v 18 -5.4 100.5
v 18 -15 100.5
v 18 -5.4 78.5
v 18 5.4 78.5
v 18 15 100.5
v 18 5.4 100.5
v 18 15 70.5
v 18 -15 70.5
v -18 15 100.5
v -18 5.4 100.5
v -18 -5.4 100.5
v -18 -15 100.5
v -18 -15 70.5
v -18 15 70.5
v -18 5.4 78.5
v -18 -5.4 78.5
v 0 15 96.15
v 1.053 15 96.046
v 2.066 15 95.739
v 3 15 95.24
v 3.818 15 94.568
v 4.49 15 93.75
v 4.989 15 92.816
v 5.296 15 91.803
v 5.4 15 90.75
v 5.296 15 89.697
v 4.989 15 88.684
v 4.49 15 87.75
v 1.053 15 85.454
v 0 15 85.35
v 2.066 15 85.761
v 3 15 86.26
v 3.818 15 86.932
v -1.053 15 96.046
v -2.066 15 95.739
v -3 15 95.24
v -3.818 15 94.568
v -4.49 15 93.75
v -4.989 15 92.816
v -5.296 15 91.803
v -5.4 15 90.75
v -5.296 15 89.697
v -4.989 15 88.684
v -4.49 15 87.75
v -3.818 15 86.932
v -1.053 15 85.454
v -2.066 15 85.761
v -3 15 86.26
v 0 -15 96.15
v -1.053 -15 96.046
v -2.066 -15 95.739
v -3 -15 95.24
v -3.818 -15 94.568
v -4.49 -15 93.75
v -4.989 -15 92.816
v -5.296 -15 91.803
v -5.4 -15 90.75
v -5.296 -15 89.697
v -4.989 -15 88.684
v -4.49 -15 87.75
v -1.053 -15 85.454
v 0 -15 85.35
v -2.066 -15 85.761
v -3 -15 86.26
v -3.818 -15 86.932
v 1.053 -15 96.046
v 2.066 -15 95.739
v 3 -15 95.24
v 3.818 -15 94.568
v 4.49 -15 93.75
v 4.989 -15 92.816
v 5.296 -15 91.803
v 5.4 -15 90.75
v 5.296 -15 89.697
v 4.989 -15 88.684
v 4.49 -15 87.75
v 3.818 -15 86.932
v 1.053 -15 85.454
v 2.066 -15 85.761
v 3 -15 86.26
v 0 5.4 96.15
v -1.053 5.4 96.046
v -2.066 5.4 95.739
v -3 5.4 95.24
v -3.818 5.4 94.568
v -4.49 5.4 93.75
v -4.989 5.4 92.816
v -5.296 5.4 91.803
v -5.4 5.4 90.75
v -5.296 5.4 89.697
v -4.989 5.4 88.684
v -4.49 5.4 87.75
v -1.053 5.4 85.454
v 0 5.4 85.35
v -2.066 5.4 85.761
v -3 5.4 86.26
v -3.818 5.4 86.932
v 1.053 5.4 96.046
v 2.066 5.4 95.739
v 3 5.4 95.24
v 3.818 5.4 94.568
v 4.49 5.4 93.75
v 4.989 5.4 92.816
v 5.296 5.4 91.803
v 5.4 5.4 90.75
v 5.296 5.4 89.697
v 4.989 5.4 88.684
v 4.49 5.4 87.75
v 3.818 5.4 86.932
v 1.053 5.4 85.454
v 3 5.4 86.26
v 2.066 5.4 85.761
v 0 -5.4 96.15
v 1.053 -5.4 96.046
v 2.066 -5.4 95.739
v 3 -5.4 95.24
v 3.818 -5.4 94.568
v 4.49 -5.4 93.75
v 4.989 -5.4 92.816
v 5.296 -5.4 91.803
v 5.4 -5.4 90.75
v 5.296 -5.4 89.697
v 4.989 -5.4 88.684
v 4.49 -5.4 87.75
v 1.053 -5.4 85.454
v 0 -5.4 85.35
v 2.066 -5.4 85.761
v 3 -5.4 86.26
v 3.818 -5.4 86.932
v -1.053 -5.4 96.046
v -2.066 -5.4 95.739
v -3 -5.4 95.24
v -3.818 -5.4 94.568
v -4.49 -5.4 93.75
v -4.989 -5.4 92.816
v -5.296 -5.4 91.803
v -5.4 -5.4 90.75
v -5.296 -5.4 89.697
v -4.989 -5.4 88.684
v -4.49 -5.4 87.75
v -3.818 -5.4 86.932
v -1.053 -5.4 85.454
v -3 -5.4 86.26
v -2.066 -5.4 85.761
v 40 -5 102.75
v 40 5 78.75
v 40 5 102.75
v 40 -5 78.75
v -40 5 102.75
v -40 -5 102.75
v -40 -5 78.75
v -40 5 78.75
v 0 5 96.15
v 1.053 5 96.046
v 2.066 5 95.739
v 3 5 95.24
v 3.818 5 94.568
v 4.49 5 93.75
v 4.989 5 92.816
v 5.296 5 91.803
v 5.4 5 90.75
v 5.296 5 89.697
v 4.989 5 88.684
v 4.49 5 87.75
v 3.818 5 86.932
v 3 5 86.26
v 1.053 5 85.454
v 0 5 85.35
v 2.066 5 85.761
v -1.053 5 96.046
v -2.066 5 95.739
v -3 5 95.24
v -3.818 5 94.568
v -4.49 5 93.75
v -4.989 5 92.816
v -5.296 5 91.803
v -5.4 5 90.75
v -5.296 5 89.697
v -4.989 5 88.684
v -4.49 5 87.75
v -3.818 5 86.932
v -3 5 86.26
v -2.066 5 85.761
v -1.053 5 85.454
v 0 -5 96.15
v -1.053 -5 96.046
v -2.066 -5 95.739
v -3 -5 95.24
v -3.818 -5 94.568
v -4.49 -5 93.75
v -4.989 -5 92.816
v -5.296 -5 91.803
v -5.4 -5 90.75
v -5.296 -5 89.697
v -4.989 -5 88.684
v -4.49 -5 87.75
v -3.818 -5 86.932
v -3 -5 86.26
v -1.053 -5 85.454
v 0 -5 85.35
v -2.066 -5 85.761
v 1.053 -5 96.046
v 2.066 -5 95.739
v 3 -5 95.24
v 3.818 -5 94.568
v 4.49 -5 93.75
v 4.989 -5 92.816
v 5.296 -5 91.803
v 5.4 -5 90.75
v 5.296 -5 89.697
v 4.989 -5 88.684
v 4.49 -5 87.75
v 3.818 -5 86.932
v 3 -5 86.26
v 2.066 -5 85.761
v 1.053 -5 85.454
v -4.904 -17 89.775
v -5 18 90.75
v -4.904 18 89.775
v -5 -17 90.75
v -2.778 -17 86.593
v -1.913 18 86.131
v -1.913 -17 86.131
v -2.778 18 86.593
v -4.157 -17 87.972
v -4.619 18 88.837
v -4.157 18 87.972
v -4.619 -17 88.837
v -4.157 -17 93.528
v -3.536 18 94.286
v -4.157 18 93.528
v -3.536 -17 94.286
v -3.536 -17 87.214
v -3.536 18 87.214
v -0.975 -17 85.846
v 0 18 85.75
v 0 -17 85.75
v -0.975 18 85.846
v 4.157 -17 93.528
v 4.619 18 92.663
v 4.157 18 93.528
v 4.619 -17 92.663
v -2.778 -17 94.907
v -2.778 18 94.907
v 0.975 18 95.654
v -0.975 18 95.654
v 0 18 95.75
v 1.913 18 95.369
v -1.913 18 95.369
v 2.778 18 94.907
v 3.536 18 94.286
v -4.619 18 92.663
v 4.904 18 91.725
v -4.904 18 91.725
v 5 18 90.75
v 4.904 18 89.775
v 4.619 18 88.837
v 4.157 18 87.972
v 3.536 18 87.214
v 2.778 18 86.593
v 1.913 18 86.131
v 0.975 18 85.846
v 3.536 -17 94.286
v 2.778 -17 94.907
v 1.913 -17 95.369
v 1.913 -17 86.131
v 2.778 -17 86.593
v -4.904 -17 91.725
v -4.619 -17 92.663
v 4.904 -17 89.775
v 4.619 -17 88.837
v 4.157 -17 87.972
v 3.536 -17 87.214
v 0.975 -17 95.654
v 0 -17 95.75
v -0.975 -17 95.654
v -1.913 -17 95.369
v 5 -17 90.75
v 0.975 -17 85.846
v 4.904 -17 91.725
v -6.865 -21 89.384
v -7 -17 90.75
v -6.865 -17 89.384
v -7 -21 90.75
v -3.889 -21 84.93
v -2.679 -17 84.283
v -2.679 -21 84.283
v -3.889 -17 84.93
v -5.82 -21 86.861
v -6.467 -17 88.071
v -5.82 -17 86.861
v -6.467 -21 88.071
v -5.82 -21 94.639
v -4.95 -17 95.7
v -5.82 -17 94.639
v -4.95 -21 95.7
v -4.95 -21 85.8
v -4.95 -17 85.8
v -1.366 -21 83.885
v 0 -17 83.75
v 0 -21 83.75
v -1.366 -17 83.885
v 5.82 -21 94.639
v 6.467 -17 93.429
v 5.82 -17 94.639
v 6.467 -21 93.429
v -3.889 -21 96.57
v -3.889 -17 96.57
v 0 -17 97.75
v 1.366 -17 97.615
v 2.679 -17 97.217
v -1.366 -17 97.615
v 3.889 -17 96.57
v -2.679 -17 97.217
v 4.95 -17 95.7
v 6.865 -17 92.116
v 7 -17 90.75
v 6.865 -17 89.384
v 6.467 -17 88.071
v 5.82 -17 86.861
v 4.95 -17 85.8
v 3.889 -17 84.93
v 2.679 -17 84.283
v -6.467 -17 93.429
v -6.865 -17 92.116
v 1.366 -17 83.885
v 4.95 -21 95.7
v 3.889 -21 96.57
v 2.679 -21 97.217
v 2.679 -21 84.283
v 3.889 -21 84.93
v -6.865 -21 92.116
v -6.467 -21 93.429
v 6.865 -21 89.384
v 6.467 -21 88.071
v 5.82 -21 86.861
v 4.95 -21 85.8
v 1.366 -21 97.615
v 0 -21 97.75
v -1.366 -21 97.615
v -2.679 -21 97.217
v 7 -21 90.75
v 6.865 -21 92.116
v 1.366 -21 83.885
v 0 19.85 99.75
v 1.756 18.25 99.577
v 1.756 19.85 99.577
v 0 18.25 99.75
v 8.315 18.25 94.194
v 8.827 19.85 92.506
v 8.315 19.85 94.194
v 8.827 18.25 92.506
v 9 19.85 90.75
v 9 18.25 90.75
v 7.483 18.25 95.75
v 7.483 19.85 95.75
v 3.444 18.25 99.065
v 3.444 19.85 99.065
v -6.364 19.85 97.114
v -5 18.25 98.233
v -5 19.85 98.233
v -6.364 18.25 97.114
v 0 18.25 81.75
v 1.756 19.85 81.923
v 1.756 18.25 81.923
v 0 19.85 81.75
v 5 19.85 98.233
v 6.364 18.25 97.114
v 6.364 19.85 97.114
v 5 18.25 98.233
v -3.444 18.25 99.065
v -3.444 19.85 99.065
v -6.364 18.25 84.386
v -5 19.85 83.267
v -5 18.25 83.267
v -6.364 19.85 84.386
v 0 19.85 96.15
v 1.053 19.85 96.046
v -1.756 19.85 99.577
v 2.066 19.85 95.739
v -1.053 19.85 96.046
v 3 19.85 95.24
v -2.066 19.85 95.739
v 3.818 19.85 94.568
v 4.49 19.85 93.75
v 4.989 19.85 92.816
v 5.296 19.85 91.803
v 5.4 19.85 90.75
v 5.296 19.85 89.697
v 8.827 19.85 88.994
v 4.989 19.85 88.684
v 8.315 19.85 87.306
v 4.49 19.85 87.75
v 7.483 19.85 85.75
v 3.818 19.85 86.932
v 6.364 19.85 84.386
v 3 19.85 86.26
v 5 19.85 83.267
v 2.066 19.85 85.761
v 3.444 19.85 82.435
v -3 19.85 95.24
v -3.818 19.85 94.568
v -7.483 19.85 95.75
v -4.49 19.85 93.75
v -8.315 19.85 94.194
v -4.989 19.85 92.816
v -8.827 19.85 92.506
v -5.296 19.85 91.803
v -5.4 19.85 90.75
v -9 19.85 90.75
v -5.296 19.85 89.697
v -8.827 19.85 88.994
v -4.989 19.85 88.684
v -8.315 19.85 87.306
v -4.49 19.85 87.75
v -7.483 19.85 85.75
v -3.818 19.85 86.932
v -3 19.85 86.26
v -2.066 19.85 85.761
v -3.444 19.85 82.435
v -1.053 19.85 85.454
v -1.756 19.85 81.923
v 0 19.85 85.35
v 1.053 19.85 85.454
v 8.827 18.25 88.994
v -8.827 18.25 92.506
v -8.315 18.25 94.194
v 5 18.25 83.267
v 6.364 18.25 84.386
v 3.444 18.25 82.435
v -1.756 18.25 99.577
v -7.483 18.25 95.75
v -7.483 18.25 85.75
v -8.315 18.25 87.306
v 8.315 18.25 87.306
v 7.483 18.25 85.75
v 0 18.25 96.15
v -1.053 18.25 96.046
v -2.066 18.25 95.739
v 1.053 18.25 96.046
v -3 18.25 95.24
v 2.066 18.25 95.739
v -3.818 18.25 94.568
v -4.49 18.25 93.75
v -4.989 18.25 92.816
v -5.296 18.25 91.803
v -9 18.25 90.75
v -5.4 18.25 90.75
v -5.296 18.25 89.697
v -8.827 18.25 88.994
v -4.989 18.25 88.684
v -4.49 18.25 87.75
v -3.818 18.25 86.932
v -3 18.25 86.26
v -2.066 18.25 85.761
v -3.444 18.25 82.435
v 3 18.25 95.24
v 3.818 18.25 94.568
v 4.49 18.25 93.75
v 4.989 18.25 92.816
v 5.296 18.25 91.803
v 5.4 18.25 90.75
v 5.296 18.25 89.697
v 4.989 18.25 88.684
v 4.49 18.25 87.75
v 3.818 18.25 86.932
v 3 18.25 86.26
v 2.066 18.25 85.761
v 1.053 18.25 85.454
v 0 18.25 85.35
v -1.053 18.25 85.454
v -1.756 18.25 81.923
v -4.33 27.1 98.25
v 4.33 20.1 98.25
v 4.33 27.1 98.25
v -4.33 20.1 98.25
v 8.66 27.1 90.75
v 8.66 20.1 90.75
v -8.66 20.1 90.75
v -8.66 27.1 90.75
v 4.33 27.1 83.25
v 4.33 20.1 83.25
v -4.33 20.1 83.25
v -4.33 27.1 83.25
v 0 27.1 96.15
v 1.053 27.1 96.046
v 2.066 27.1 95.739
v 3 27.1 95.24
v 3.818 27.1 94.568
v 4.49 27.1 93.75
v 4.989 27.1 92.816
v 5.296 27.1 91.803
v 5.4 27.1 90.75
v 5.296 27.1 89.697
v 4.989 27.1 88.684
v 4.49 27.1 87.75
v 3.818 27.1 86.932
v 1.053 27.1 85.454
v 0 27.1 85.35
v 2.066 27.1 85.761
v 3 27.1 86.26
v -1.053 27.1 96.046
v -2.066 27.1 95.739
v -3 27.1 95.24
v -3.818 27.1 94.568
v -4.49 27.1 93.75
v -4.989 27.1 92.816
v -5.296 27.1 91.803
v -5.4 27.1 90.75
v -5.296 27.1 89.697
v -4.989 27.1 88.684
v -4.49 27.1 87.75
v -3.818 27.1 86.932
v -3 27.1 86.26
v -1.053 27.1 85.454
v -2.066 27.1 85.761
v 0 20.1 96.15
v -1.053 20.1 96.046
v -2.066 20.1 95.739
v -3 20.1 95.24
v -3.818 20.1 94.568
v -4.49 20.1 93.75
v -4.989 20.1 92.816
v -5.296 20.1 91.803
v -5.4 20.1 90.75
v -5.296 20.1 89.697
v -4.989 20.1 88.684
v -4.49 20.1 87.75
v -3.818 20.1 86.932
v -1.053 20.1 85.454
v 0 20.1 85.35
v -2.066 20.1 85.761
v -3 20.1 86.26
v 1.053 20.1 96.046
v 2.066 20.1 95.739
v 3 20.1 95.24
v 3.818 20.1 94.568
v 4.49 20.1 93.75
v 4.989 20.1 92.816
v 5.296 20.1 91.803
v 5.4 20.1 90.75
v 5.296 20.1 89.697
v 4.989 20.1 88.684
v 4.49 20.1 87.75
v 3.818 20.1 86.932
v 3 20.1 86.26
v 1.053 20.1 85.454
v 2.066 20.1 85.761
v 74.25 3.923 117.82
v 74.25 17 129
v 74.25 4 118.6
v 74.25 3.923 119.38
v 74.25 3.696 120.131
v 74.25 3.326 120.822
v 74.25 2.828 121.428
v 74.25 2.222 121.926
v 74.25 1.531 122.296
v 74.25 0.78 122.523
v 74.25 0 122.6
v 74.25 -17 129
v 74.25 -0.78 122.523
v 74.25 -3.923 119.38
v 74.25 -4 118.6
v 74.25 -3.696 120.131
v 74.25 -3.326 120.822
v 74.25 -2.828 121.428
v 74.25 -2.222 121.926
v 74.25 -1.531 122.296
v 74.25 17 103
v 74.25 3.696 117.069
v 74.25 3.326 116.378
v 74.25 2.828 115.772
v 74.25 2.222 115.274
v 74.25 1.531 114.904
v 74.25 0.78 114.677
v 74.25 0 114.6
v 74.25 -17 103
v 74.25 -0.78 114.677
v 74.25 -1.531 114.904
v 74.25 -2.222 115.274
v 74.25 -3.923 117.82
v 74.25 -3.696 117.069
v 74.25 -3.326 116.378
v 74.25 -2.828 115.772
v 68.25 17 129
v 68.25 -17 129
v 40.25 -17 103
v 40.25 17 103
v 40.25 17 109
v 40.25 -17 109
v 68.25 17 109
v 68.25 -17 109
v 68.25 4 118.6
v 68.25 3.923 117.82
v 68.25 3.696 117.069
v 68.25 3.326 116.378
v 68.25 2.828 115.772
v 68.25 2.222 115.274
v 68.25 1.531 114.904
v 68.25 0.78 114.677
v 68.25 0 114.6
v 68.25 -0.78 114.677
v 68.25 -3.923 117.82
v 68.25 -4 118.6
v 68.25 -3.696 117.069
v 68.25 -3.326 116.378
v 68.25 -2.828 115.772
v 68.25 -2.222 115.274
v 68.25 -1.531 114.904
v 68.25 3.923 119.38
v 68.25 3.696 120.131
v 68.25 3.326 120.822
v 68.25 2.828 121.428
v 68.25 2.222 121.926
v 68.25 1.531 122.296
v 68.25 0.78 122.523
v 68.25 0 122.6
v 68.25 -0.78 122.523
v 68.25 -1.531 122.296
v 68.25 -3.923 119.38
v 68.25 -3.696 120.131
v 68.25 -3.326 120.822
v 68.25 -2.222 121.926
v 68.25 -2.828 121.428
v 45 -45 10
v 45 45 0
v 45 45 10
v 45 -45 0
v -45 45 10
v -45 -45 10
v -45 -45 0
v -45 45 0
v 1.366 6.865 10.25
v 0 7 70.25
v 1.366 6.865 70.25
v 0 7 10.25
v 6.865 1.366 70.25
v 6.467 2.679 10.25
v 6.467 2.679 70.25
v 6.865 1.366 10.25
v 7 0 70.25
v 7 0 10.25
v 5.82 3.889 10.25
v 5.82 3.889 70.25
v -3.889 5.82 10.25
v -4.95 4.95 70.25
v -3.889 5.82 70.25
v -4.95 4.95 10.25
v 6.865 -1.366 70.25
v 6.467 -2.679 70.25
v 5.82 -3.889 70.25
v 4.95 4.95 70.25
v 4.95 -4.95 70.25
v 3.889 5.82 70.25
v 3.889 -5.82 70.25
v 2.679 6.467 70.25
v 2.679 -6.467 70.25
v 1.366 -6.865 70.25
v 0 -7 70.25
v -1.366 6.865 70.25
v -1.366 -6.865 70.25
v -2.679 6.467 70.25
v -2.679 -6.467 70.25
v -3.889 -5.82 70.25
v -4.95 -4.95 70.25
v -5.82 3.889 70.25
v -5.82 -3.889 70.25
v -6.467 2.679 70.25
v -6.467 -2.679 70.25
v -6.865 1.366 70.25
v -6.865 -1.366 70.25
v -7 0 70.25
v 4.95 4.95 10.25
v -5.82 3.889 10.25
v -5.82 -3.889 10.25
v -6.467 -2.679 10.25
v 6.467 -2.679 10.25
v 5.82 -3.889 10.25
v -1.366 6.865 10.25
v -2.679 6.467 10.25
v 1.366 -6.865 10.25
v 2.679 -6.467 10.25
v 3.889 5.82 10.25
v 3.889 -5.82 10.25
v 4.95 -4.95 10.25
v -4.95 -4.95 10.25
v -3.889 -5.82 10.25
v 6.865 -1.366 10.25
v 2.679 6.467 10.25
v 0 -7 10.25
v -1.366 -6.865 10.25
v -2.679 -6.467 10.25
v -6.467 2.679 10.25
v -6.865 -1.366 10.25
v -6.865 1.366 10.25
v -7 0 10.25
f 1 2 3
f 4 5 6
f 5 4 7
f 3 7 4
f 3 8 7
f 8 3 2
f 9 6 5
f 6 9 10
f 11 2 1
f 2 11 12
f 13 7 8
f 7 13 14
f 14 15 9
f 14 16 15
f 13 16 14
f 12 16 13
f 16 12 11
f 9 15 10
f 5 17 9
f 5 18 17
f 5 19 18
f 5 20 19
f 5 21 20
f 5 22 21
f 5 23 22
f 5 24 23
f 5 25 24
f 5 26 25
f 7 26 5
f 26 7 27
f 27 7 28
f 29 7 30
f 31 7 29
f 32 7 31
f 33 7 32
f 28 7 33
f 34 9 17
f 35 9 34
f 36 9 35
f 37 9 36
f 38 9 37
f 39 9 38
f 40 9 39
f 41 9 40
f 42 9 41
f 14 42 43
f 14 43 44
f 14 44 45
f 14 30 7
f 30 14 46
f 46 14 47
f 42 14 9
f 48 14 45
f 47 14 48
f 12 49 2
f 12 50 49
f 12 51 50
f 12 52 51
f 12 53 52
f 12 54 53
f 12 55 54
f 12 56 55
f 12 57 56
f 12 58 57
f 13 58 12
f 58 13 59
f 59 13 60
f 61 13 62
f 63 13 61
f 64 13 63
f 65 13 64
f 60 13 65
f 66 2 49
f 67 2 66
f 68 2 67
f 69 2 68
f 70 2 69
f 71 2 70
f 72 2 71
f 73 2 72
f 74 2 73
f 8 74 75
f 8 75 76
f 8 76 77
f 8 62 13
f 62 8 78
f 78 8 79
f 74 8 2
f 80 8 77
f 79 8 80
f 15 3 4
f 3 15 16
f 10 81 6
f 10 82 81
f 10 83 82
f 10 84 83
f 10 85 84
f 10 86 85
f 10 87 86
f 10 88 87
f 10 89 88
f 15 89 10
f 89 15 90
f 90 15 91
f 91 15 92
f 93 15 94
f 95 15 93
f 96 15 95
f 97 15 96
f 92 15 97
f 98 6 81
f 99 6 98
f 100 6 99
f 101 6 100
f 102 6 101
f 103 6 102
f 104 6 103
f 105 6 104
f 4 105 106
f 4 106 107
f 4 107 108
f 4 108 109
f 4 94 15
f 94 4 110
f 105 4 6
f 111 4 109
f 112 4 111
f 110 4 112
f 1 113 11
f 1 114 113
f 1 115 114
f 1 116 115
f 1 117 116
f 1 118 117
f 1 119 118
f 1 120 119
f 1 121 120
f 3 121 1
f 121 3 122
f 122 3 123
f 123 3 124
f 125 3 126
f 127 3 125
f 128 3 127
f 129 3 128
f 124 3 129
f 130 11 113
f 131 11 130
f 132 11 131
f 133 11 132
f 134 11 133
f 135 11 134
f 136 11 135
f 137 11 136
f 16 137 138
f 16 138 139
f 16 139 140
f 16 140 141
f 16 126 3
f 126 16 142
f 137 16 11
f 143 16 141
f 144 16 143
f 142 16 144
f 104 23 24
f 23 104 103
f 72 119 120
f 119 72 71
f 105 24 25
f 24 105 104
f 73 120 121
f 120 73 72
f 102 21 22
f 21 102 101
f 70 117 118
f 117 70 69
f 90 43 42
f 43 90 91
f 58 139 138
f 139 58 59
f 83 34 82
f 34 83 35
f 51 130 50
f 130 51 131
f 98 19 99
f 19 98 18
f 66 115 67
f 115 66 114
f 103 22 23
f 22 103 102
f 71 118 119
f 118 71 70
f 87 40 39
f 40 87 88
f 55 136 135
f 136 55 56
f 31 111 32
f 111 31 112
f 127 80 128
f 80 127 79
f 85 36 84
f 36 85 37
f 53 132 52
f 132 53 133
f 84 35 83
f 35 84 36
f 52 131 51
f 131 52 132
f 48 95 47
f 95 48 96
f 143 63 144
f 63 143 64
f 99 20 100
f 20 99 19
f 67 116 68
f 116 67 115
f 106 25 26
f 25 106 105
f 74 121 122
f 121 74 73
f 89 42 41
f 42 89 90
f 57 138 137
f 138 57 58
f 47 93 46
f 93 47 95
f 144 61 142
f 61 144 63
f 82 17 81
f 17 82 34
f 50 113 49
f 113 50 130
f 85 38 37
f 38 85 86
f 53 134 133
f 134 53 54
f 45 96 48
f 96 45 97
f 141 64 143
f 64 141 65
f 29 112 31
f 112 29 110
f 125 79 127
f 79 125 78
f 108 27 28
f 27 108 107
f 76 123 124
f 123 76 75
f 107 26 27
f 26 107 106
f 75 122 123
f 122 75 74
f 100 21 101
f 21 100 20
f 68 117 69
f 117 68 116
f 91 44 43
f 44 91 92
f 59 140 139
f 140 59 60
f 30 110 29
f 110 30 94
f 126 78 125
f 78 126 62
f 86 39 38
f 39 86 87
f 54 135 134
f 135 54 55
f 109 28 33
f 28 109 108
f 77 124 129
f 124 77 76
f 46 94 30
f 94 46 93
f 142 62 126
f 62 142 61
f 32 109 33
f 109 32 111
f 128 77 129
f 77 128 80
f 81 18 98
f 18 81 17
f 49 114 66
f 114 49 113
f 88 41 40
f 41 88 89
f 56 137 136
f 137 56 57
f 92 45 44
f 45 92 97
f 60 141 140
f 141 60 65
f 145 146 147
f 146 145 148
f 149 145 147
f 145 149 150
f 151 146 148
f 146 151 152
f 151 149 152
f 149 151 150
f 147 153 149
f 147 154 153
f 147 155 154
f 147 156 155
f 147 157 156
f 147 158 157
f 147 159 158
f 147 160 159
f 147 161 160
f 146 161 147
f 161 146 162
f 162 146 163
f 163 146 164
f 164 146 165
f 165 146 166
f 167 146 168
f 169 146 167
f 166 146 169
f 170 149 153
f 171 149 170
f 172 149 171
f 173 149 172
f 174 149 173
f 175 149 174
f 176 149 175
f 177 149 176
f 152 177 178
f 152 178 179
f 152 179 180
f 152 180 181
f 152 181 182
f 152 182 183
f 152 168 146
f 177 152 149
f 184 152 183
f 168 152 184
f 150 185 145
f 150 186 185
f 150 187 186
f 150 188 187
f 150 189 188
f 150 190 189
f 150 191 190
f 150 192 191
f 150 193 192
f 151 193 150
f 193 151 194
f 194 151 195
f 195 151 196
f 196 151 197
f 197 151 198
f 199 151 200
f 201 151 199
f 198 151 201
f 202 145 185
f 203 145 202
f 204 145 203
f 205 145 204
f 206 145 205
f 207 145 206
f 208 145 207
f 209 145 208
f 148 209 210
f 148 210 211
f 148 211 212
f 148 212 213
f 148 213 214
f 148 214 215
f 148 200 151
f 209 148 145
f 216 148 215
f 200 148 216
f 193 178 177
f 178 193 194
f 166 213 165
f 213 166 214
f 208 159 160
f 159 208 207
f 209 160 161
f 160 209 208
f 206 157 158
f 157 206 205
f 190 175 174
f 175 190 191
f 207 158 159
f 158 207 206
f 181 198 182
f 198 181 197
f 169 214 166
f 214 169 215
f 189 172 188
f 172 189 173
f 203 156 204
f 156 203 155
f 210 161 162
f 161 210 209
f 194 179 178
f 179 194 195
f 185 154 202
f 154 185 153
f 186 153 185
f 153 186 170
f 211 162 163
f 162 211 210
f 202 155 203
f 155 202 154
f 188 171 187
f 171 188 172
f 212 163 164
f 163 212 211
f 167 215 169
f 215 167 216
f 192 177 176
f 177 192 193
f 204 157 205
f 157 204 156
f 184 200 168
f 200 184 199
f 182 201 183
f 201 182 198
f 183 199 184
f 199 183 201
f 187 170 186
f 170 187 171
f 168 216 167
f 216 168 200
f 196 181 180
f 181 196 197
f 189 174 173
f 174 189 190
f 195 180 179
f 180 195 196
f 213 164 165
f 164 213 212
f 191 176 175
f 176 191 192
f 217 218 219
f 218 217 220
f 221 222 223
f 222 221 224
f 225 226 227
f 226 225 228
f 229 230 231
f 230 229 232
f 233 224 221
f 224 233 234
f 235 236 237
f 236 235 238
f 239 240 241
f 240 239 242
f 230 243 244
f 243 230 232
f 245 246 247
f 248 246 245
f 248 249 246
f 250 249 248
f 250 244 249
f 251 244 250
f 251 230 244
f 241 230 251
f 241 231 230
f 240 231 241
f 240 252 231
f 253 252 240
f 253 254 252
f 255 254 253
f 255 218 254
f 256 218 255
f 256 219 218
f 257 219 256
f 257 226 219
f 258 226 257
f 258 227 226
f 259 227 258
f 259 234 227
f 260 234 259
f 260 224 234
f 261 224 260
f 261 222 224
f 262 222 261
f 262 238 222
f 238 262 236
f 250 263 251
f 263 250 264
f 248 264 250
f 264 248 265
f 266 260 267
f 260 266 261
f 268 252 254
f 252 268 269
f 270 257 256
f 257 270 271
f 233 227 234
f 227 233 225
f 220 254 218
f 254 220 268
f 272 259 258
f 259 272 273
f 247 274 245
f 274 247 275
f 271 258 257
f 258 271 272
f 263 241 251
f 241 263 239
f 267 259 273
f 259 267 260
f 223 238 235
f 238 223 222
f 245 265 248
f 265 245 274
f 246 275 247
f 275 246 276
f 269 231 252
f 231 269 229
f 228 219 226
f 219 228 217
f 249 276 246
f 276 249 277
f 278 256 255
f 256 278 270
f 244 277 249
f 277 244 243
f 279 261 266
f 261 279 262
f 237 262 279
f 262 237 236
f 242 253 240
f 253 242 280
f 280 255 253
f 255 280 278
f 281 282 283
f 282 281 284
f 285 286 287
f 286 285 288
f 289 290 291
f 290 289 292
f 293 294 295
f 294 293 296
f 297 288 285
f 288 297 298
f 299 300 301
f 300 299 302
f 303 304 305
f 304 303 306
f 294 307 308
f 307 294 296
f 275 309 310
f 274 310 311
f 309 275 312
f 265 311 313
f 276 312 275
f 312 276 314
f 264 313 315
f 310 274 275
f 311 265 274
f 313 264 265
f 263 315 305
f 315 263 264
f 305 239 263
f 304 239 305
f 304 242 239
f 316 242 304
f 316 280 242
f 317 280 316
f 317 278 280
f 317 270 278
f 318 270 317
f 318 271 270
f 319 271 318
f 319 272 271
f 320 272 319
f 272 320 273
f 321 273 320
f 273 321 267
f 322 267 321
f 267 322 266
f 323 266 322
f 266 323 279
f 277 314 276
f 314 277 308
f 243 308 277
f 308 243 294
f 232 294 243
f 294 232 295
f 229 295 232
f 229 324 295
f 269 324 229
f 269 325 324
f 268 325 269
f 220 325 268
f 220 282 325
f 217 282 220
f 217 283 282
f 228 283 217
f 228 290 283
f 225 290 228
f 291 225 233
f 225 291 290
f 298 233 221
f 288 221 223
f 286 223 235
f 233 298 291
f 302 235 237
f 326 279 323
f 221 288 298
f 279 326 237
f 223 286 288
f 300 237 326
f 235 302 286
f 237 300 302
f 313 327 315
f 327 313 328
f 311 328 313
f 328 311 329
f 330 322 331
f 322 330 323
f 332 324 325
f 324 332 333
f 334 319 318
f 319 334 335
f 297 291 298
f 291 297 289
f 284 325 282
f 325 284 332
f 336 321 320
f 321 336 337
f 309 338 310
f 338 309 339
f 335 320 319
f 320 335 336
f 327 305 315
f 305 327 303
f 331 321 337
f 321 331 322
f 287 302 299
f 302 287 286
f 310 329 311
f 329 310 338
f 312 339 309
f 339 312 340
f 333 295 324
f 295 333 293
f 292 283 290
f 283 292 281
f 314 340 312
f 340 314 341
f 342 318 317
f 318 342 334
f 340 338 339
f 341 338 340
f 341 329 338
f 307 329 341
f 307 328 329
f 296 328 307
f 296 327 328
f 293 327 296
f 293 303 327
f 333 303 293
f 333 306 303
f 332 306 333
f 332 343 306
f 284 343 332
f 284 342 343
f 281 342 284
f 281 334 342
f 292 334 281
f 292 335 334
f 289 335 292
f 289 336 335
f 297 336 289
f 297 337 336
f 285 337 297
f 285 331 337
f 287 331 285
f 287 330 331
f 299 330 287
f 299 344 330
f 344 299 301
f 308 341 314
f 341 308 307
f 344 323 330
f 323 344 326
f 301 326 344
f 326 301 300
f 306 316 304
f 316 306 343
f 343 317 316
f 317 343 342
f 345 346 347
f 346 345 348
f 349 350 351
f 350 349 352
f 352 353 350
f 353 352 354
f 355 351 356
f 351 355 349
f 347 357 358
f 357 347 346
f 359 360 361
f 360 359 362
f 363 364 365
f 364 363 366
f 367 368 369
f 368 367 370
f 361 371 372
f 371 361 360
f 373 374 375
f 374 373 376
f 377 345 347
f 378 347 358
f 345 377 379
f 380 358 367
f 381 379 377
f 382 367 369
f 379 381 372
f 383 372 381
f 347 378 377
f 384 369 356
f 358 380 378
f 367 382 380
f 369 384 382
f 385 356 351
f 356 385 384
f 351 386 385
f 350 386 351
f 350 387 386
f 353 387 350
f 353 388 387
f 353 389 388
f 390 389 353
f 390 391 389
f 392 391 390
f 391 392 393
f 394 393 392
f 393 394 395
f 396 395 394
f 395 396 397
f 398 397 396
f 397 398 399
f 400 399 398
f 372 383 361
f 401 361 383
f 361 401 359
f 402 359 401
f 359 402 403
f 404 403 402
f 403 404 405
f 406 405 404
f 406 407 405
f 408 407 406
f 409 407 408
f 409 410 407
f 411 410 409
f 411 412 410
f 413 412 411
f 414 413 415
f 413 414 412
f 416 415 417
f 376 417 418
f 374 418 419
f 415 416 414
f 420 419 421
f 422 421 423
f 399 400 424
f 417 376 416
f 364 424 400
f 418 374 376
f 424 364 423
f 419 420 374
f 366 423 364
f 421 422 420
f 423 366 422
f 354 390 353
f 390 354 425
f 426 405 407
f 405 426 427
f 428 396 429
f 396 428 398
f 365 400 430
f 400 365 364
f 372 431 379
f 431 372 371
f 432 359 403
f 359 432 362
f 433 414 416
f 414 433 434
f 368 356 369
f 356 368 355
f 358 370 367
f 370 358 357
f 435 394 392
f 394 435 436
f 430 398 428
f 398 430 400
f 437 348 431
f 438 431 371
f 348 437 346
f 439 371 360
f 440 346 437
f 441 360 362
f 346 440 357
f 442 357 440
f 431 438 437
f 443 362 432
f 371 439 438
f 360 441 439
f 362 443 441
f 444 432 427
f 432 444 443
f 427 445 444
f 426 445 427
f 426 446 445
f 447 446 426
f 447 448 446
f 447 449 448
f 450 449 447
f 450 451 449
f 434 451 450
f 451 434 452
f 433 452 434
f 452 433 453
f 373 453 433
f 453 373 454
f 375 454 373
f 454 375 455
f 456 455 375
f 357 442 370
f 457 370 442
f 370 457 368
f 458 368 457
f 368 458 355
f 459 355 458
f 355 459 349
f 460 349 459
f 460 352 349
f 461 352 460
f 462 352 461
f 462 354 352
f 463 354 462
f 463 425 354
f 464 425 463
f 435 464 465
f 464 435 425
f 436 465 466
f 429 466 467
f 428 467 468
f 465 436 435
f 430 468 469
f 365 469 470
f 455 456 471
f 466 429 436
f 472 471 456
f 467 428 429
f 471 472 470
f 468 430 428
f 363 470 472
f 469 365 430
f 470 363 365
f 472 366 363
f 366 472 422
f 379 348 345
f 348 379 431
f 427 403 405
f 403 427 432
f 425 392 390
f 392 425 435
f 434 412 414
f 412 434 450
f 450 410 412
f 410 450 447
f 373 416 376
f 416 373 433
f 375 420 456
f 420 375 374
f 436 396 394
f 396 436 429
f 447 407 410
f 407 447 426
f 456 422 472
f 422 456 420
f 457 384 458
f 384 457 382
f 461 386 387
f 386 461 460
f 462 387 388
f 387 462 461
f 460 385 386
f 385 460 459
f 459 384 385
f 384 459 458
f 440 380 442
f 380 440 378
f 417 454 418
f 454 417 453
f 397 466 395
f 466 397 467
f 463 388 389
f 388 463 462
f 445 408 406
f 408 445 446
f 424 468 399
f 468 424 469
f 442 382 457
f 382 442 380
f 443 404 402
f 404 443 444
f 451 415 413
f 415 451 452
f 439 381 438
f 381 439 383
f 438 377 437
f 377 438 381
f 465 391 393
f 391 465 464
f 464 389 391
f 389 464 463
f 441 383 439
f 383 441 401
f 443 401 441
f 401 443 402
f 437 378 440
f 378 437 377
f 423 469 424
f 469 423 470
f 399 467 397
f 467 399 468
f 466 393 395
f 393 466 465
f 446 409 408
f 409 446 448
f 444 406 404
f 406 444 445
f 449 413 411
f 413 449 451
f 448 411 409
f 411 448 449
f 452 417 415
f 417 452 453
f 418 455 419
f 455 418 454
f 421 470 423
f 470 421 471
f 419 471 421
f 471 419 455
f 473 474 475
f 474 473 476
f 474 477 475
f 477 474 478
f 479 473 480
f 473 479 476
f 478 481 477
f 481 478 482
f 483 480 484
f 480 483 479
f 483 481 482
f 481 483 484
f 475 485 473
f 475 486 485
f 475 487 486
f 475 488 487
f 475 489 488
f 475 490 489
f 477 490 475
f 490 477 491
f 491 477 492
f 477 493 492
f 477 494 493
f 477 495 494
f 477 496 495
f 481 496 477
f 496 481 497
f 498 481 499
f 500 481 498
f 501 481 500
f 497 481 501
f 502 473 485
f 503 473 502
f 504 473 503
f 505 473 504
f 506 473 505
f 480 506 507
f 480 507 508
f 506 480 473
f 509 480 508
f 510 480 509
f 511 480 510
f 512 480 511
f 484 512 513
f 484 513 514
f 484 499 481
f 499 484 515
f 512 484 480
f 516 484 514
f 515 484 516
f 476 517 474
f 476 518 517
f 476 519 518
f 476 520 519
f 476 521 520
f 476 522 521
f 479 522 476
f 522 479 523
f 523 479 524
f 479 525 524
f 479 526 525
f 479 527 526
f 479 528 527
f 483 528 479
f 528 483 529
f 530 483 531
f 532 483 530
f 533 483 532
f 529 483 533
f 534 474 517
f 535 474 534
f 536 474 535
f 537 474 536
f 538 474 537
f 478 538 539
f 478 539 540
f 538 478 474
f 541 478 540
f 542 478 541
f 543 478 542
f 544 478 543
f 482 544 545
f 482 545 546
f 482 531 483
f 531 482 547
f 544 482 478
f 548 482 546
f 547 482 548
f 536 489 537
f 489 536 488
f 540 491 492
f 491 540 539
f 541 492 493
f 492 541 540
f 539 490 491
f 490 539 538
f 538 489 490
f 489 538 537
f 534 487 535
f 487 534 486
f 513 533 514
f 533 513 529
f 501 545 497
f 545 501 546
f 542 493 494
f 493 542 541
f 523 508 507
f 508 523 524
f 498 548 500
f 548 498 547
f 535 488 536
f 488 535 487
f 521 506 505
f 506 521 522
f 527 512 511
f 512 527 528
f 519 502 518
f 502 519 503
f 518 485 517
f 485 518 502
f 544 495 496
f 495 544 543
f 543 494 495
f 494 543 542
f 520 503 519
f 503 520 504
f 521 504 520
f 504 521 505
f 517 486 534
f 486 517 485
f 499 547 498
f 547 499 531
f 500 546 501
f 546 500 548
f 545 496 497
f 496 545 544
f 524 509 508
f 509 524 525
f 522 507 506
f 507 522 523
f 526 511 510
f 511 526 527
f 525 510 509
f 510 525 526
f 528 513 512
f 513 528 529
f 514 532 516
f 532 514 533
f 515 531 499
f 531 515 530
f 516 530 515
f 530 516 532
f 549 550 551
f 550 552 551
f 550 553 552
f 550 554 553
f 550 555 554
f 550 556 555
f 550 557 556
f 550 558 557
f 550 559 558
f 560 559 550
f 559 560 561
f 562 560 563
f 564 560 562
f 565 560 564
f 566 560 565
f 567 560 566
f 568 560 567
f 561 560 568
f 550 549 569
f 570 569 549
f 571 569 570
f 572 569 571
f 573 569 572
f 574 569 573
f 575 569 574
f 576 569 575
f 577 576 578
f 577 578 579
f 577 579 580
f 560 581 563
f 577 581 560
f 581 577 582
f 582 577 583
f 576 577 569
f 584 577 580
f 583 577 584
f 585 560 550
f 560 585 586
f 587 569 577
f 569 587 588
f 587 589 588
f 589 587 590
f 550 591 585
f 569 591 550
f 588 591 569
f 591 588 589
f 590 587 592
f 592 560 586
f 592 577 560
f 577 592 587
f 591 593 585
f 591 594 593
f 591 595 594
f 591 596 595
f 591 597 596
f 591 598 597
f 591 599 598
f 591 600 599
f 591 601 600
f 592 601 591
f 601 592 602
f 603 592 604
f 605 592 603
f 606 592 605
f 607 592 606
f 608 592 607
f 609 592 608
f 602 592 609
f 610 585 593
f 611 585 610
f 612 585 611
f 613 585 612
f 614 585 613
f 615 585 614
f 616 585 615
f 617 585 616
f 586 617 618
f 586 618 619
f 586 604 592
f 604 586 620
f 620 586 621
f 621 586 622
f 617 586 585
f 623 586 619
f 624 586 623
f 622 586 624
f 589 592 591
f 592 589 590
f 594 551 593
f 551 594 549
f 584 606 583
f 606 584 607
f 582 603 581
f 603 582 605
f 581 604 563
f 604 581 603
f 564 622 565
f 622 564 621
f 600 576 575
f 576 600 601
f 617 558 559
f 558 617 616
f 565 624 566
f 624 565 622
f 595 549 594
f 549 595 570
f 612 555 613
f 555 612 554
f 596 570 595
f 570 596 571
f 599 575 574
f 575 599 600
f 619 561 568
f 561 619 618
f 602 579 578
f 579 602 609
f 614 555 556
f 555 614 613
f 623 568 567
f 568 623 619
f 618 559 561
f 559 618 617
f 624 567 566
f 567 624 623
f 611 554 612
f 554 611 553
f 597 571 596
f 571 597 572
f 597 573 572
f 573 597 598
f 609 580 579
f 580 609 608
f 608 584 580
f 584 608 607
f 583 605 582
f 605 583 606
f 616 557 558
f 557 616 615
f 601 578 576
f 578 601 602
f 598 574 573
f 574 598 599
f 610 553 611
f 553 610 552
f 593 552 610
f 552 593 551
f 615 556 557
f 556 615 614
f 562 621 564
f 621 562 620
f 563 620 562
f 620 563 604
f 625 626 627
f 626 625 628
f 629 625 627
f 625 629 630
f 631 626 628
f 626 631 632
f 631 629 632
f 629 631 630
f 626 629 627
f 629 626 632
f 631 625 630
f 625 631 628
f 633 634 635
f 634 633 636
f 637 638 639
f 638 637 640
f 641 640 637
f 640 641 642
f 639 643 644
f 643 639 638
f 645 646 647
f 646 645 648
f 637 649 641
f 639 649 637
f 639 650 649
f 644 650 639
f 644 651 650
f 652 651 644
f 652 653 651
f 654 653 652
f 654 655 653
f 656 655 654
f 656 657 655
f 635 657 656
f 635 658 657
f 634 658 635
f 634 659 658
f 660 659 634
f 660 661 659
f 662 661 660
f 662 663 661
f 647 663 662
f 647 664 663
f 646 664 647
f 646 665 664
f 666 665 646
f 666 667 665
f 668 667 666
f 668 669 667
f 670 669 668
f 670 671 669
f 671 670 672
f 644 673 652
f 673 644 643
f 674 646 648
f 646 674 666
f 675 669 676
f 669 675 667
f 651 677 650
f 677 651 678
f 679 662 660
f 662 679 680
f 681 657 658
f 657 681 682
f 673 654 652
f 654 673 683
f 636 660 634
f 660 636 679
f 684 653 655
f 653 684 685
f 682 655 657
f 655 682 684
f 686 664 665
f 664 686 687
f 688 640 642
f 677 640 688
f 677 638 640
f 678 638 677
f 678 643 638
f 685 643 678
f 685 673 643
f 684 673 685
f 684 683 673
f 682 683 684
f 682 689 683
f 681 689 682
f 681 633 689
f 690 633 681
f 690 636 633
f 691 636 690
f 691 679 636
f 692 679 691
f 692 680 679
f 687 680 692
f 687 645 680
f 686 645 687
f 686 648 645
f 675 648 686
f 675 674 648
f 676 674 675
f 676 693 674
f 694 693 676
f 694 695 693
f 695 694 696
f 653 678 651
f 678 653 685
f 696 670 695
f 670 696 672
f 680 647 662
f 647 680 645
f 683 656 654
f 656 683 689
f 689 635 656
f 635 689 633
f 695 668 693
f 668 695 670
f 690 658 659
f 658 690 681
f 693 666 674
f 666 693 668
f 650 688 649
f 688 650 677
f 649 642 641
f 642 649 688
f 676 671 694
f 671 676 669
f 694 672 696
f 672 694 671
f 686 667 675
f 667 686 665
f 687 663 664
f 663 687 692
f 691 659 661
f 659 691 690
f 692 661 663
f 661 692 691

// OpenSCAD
$fn = 32;

// ------------------------------------------------------------------------
// Lamp arm: column d14 x 60 mm, arm 80 mm
// Every part is its own module, assembly() places every instance.
// ------------------------------------------------------------------------

// --- part 1 ---
module lamp_base() {
  difference() {
    translate([-45, -45, 0]) cube([90, 90, 10]);
  }
}

// --- part 2 ---
module lamp_column() {
  cylinder(h = 60, d = 14);
}

// --- part 3 ---
module head_fork() {
  difference() {
    translate([-18, -15, 0]) cube([36, 30, 30]);
    translate([-19, -5.4, 8]) cube([38, 10.8, 23]);
    translate([0, 0, 20.25]) rotate([90, 0, 0]) cylinder(h = 32, d = 10.8, center = true);
  }
}

// --- part 4 ---
module lamp_arm() {
  difference() {
    translate([-40, -5, 0]) cube([80, 10, 24]);
    translate([0, 0, 12]) rotate([90, 0, 0]) cylinder(h = 12, d = 10.8, center = true);
  }
}

// --- part 5 ---
module arm_pin() {
  rotate([0, 90, 0]) cylinder(h = 36, d = 10, center = true);
  translate([-21, 0, 0]) rotate([0, 90, 0]) cylinder(h = 4, d = 14);
}

// --- part 6 ---
module arm_washer() {
  difference() {
      translate([0, 0, 0]) cylinder(h = 1.6, d = 18);
      translate([0, 0, -1]) cylinder(h = 3.6, d = 10.8);
    }
}

// --- part 7 ---
module arm_nut() {
  difference() {
    linear_extrude(height = 7) polygon(points = [[8.66, 0], [4.33, 7.5], [-4.33, 7.5], [-8.66, 0], [-4.33, -7.5], [4.33, -7.5]]);
    translate([0, 0, -1]) cylinder(h = 9, d = 10.8);
  }
}

// --- part 8 ---
module shade_bracket() {
  difference() {
    translate([-17, -17, 0]) cube([34, 34, 26]);
    translate([-18, -18, 6]) cube([29, 36, 21]);
    translate([14, 0, 15.6]) rotate([0, 90, 0]) cylinder(h = 8, d = 8, center = true);
  }
}

// --- assembly ---
module assembly() {
  color([0.80, 0.24, 0.20]) translate([0, 0, 0]) rotate([0, 0, 0]) lamp_base();
  color([0.20, 0.45, 0.75]) translate([0, 0, 10.25]) rotate([0, 0, 0]) lamp_column();
  color([0.25, 0.62, 0.32]) translate([0, 0, 70.5]) rotate([0, 0, 0]) head_fork();
  color([0.92, 0.70, 0.18]) translate([0, 0, 78.75]) rotate([0, 0, 0]) lamp_arm();
  color([0.58, 0.35, 0.70]) translate([0, 0, 90.75]) rotate([0, 0, 90]) arm_pin();
  color([0.16, 0.66, 0.66]) translate([0, 19.85, 90.75]) rotate([90, 0, 0]) arm_washer();
  color([0.85, 0.48, 0.18]) translate([0, 27.1, 90.75]) rotate([90, 0, 0]) arm_nut();
  color([0.55, 0.60, 0.65]) translate([57.25, 0, 103]) rotate([0, 0, 0]) shade_bracket();
}

assembly();
